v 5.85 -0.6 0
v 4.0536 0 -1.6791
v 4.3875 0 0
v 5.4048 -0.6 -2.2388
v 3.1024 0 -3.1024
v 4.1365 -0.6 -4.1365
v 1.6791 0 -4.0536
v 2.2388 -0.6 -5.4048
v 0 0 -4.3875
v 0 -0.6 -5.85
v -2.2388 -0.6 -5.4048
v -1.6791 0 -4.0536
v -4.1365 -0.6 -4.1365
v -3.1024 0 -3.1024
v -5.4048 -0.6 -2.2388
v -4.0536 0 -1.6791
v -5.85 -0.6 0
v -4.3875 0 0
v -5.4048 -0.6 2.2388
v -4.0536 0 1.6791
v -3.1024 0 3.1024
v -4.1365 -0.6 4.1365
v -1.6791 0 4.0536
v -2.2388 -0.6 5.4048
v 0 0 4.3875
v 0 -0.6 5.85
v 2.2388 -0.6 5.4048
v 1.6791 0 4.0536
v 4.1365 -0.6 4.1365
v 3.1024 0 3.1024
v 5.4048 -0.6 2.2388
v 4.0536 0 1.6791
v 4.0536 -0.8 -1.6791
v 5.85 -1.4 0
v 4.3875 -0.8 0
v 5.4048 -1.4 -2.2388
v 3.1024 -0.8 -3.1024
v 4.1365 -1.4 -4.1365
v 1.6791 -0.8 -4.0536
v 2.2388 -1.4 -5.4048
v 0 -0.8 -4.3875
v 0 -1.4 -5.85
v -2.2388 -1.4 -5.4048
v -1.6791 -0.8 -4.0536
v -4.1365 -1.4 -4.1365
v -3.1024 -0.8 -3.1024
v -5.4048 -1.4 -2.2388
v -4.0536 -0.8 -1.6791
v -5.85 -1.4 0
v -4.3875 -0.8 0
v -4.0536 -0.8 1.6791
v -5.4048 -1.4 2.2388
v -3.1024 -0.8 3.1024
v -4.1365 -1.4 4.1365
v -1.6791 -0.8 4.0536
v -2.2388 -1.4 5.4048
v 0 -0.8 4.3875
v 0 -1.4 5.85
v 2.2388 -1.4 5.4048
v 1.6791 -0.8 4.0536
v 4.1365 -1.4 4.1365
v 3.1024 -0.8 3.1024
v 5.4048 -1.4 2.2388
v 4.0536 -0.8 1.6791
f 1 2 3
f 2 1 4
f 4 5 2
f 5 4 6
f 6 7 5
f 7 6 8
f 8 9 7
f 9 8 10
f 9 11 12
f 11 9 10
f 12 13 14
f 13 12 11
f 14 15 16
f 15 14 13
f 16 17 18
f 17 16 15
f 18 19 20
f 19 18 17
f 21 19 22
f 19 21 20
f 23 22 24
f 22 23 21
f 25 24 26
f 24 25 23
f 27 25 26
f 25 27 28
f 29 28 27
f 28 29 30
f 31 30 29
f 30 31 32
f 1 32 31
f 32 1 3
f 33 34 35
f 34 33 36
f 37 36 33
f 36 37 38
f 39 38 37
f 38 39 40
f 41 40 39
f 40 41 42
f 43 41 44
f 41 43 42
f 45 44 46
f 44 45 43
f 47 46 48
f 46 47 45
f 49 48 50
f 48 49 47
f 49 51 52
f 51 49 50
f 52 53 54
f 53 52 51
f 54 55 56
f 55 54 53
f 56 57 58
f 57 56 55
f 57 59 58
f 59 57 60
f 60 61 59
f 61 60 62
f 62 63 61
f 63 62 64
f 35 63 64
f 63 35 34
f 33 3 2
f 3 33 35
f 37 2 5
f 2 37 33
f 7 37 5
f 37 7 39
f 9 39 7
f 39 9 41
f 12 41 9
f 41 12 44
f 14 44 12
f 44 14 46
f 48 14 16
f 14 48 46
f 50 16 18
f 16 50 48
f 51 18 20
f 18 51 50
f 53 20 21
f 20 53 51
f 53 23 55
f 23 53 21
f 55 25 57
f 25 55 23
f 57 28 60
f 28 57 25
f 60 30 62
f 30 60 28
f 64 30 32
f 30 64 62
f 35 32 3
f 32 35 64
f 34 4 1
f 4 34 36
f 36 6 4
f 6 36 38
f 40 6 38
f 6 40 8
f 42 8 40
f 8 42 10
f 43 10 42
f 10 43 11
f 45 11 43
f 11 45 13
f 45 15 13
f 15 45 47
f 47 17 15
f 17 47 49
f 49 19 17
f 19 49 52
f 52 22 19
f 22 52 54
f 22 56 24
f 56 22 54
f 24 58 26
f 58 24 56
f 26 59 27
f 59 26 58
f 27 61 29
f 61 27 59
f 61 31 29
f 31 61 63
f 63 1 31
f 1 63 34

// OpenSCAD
// file: ../p/4-4edge.scad
use <../lib.scad>
function ldraw_lib__4_4edge() = [
// 0 Circle 1.0
// 0 Name: 4-4edge.dat
// 0 Author: James Jessiman
// 0 !LDRAW_ORG Primitive UPDATE 2017-01
// 0 !LICENSE Licensed under CC BY 2.0 and CC BY 4.0 : see CAreadme.txt
// 
// 0 BFC CERTIFY CCW
  [0,"BFC","CERTIFY"],
  [0,"BFC","CCW"],
// 
// 0 !HISTORY 1998-12-15 [PTadmin] Official Update 1998-10
// 0 !HISTORY 2005-12-28 [PTadmin] Official Update 2005-01
// 0 !HISTORY 2007-06-24 [PTadmin] Header formatted for Contributor Agreement
// 0 !HISTORY 2008-07-01 [PTadmin] Official Update 2008-01
// 0 !HISTORY 2017-01-15 [Steffen] BFCed
// 0 !HISTORY 2017-12-30 [PTadmin] Official Update 2017-01
// 
// 
// 2 24 1 0 0 0.9239 0 0.3827
  [2,24,1,0,0,0.9239,0,0.3827],
// 2 24 0.9239 0 0.3827 0.7071 0 0.7071
  [2,24,0.9239,0,0.3827,0.7071,0,0.7071],
// 2 24 0.7071 0 0.7071 0.3827 0 0.9239
  [2,24,0.7071,0,0.7071,0.3827,0,0.9239],
// 2 24 0.3827 0 0.9239 0 0 1
  [2,24,0.3827,0,0.9239,0,0,1],
// 2 24 0 0 1 -0.3827 0 0.9239
  [2,24,0,0,1,-0.3827,0,0.9239],
// 2 24 -0.3827 0 0.9239 -0.7071 0 0.7071
  [2,24,-0.3827,0,0.9239,-0.7071,0,0.7071],
// 2 24 -0.7071 0 0.7071 -0.9239 0 0.3827
  [2,24,-0.7071,0,0.7071,-0.9239,0,0.3827],
// 2 24 -0.9239 0 0.3827 -1 0 -0
  [2,24,-0.9239,0,0.3827,-1,0,-0],
// 2 24 -1 0 -0 -0.9239 0 -0.3827
  [2,24,-1,0,-0,-0.9239,0,-0.3827],
// 2 24 -0.9239 0 -0.3827 -0.7071 0 -0.7071
  [2,24,-0.9239,0,-0.3827,-0.7071,0,-0.7071],
// 2 24 -0.7071 0 -0.7071 -0.3827 0 -0.9239
  [2,24,-0.7071,0,-0.7071,-0.3827,0,-0.9239],
// 2 24 -0.3827 0 -0.9239 0 0 -1
  [2,24,-0.3827,0,-0.9239,0,0,-1],
// 2 24 0 0 -1 0.3827 0 -0.9239
  [2,24,0,0,-1,0.3827,0,-0.9239],
// 2 24 0.3827 0 -0.9239 0.7071 0 -0.7071
  [2,24,0.3827,0,-0.9239,0.7071,0,-0.7071],
// 2 24 0.7071 0 -0.7071 0.9239 0 -0.3827
  [2,24,0.7071,0,-0.7071,0.9239,0,-0.3827],
// 2 24 0.9239 0 -0.3827 1 0 0
  [2,24,0.9239,0,-0.3827,1,0,0],
];
module ldraw_lib__4_4edge(step=0, col=false, unit=2/5, alt=false, line=0.2, solid=!$preview)
    makepoly(ldraw_lib__4_4edge(), step=step, col=col, unit=unit, alt=alt, line=line, solid=solid);
ldraw_lib__4_4edge(line=0.2);
// file: ../p/4-4cyli.scad
use <../lib.scad>
function ldraw_lib__4_4cyli() = [
// 0 Cylinder 1.0
// 0 Name: 4-4cyli.dat
// 0 Author: James Jessiman
// 0 !LDRAW_ORG Primitive UPDATE 2005-01
// 0 !LICENSE Licensed under CC BY 2.0 and CC BY 4.0 : see CAreadme.txt
// 
// 0 BFC CERTIFY CCW
  [0,"BFC","CERTIFY"],
  [0,"BFC","CCW"],
// 
// 0 !HISTORY 1998-12-15 [PTadmin] Official Update 1998-10
// 0 !HISTORY 2002-03-23 [sbliss] Added BFC statement; merged headers from files in distributions LDraw 0.27 and Complete.
// 0 !HISTORY 2002-04-25 [PTadmin] Official Update 2002-02
// 0 !HISTORY 2004-12-14 [guyvivan] BFC CCW
// 0 !HISTORY 2005-12-28 [PTadmin] Official Update 2005-01
// 0 !HISTORY 2007-06-24 [PTadmin] Header formatted for Contributor Agreement
// 0 !HISTORY 2008-07-01 [PTadmin] Official Update 2008-01
// 
// 
// 4 16 1 1 0 0.9239 1 0.3827 0.9239 0 0.3827 1 0 0
  [4,16,1,1,0,0.9239,1,0.3827,0.9239,0,0.3827,1,0,0],
// 5 24 1 0 0 1 1 0 0.9239 0 0.3827 0.9239 0 -0.3827
  [5,24,1,0,0,1,1,0,0.9239,0,0.3827,0.9239,0,-0.3827],
// 4 16 0.9239 1 0.3827 0.7071 1 0.7071 0.7071 0 0.7071 0.9239 0 0.3827
  [4,16,0.9239,1,0.3827,0.7071,1,0.7071,0.7071,0,0.7071,0.9239,0,0.3827],
// 5 24 0.9239 0 0.3827 0.9239 1 0.3827 0.7071 0 0.7071 1 0 0
  [5,24,0.9239,0,0.3827,0.9239,1,0.3827,0.7071,0,0.7071,1,0,0],
// 4 16 0.7071 1 0.7071 0.3827 1 0.9239 0.3827 0 0.9239 0.7071 0 0.7071
  [4,16,0.7071,1,0.7071,0.3827,1,0.9239,0.3827,0,0.9239,0.7071,0,0.7071],
// 5 24 0.7071 0 0.7071 0.7071 1 0.7071 0.3827 0 0.9239 0.9239 0 0.3827
  [5,24,0.7071,0,0.7071,0.7071,1,0.7071,0.3827,0,0.9239,0.9239,0,0.3827],
// 4 16 0.3827 1 0.9239 0 1 1 0 0 1 0.3827 0 0.9239
  [4,16,0.3827,1,0.9239,0,1,1,0,0,1,0.3827,0,0.9239],
// 5 24 0.3827 0 0.9239 0.3827 1 0.9239 0 0 1 0.7071 0 0.7071
  [5,24,0.3827,0,0.9239,0.3827,1,0.9239,0,0,1,0.7071,0,0.7071],
// 4 16 0 1 1 -0.3827 1 0.9239 -0.3827 0 0.9239 0 0 1
  [4,16,0,1,1,-0.3827,1,0.9239,-0.3827,0,0.9239,0,0,1],
// 5 24 0 0 1 0 1 1 -0.3827 0 0.9239 0.3827 0 0.9239
  [5,24,0,0,1,0,1,1,-0.3827,0,0.9239,0.3827,0,0.9239],
// 4 16 -0.3827 1 0.9239 -0.7071 1 0.7071 -0.7071 0 0.7071 -0.3827 0 0.9239
  [4,16,-0.3827,1,0.9239,-0.7071,1,0.7071,-0.7071,0,0.7071,-0.3827,0,0.9239],
// 5 24 -0.3827 0 0.9239 -0.3827 1 0.9239 -0.7071 0 0.7071 0 0 1
  [5,24,-0.3827,0,0.9239,-0.3827,1,0.9239,-0.7071,0,0.7071,0,0,1],
// 4 16 -0.7071 1 0.7071 -0.9239 1 0.3827 -0.9239 0 0.3827 -0.7071 0 0.7071
  [4,16,-0.7071,1,0.7071,-0.9239,1,0.3827,-0.9239,0,0.3827,-0.7071,0,0.7071],
// 5 24 -0.7071 0 0.7071 -0.7071 1 0.7071 -0.9239 0 0.3827 -0.3827 0 0.9239
  [5,24,-0.7071,0,0.7071,-0.7071,1,0.7071,-0.9239,0,0.3827,-0.3827,0,0.9239],
// 4 16 -0.9239 1 0.3827 -1 1 0 -1 0 0 -0.9239 0 0.3827
  [4,16,-0.9239,1,0.3827,-1,1,0,-1,0,0,-0.9239,0,0.3827],
// 5 24 -0.9239 0 0.3827 -0.9239 1 0.3827 -1 0 0 -0.7071 0 0.7071
  [5,24,-0.9239,0,0.3827,-0.9239,1,0.3827,-1,0,0,-0.7071,0,0.7071],
// 4 16 -1 1 0 -0.9239 1 -0.3827 -0.9239 0 -0.3827 -1 0 0
  [4,16,-1,1,0,-0.9239,1,-0.3827,-0.9239,0,-0.3827,-1,0,0],
// 5 24 -1 0 0 -1 1 0 -0.9239 0 -0.3827 -0.9239 0 0.3827
  [5,24,-1,0,0,-1,1,0,-0.9239,0,-0.3827,-0.9239,0,0.3827],
// 4 16 -0.9239 1 -0.3827 -0.7071 1 -0.7071 -0.7071 0 -0.7071 -0.9239 0 -0.3827
  [4,16,-0.9239,1,-0.3827,-0.7071,1,-0.7071,-0.7071,0,-0.7071,-0.9239,0,-0.3827],
// 5 24 -0.9239 0 -0.3827 -0.9239 1 -0.3827 -0.7071 0 -0.7071 -1 0 0
  [5,24,-0.9239,0,-0.3827,-0.9239,1,-0.3827,-0.7071,0,-0.7071,-1,0,0],
// 4 16 -0.7071 1 -0.7071 -0.3827 1 -0.9239 -0.3827 0 -0.9239 -0.7071 0 -0.7071
  [4,16,-0.7071,1,-0.7071,-0.3827,1,-0.9239,-0.3827,0,-0.9239,-0.7071,0,-0.7071],
// 5 24 -0.7071 0 -0.7071 -0.7071 1 -0.7071 -0.3827 0 -0.9239 -0.9239 0 -0.3827
  [5,24,-0.7071,0,-0.7071,-0.7071,1,-0.7071,-0.3827,0,-0.9239,-0.9239,0,-0.3827],
// 4 16 -0.3827 1 -0.9239 0 1 -1 0 0 -1 -0.3827 0 -0.9239
  [4,16,-0.3827,1,-0.9239,0,1,-1,0,0,-1,-0.3827,0,-0.9239],
// 5 24 -0.3827 0 -0.9239 -0.3827 1 -0.9239 0 0 -1 -0.7071 0 -0.7071
  [5,24,-0.3827,0,-0.9239,-0.3827,1,-0.9239,0,0,-1,-0.7071,0,-0.7071],
// 4 16 0 1 -1 0.3827 1 -0.9239 0.3827 0 -0.9239 0 0 -1
  [4,16,0,1,-1,0.3827,1,-0.9239,0.3827,0,-0.9239,0,0,-1],
// 5 24 0 0 -1 0 1 -1 0.3827 0 -0.9239 -0.3827 0 -0.9239
  [5,24,0,0,-1,0,1,-1,0.3827,0,-0.9239,-0.3827,0,-0.9239],
// 4 16 0.3827 1 -0.9239 0.7071 1 -0.7071 0.7071 0 -0.7071 0.3827 0 -0.9239
  [4,16,0.3827,1,-0.9239,0.7071,1,-0.7071,0.7071,0,-0.7071,0.3827,0,-0.9239],
// 5 24 0.3827 0 -0.9239 0.3827 1 -0.9239 0.7071 0 -0.7071 0 0 -1
  [5,24,0.3827,0,-0.9239,0.3827,1,-0.9239,0.7071,0,-0.7071,0,0,-1],
// 4 16 0.7071 1 -0.7071 0.9239 1 -0.3827 0.9239 0 -0.3827 0.7071 0 -0.7071
  [4,16,0.7071,1,-0.7071,0.9239,1,-0.3827,0.9239,0,-0.3827,0.7071,0,-0.7071],
// 5 24 0.7071 0 -0.7071 0.7071 1 -0.7071 0.9239 0 -0.3827 0.3827 0 -0.9239
  [5,24,0.7071,0,-0.7071,0.7071,1,-0.7071,0.9239,0,-0.3827,0.3827,0,-0.9239],
// 4 16 0.9239 1 -0.3827 1 1 0 1 0 0 0.9239 0 -0.3827
  [4,16,0.9239,1,-0.3827,1,1,0,1,0,0,0.9239,0,-0.3827],
// 5 24 0.9239 0 -0.3827 0.9239 1 -0.3827 1 0 0 0.7071 0 -0.7071
  [5,24,0.9239,0,-0.3827,0.9239,1,-0.3827,1,0,0,0.7071,0,-0.7071],
// 0
];
module ldraw_lib__4_4cyli(step=0, col=false, unit=2/5, alt=false, line=0.2, solid=!$preview)
    makepoly(ldraw_lib__4_4cyli(), step=step, col=col, unit=unit, alt=alt, line=line, solid=solid);
ldraw_lib__4_4cyli(line=0.2);
// file: ../p/4-4cylo.scad
use <../lib.scad>
use <4-4cyli.scad>
use <4-4edge.scad>
function ldraw_lib__4_4cylo() = [
// 0 Cylinder Open 1.0
// 0 Name: 4-4cylo.dat
// 0 Author: Mark Kennedy [mkennedy]
// 0 !LDRAW_ORG Primitive UPDATE 2010-01
// 0 !LICENSE Licensed under CC BY 2.0 and CC BY 4.0 : see CAreadme.txt
// 
// 0 BFC CERTIFY CCW
  [0,"BFC","CERTIFY"],
  [0,"BFC","CCW"],
// 
// 0 !HISTORY 2010-04-05 [PTadmin] Official Update 2010-01
// 
// 
// 1 16 0 0 0 1 0 0 0 1 0 0 0 1 4-4edge.dat
  [1,16,0,0,0,1,0,0,0,1,0,0,0,1, ldraw_lib__4_4edge()],
// 1 16 0 1 0 1 0 0 0 1 0 0 0 1 4-4edge.dat
  [1,16,0,1,0,1,0,0,0,1,0,0,0,1, ldraw_lib__4_4edge()],
// 1 16 0 0 0 1 0 0 0 1 0 0 0 1 4-4cyli.dat
  [1,16,0,0,0,1,0,0,0,1,0,0,0,1, ldraw_lib__4_4cyli()],
// 0
];
module ldraw_lib__4_4cylo(step=0, col=false, unit=2/5, alt=false, line=0.2, solid=!$preview)
    makepoly(ldraw_lib__4_4cylo(), step=step, col=col, unit=unit, alt=alt, line=line, solid=solid);
ldraw_lib__4_4cylo(line=0.2);
// file: ../p/4-4con3.scad
use <../lib.scad>
function ldraw_lib__4_4con3() = [
// 0 Cone  3 x 1.0
// 0 Name: 4-4con3.dat
// 0 Author: Niels Karsdorp [nielsk]
// 0 !LDRAW_ORG Primitive UPDATE 2003-02
// 0 !LICENSE Licensed under CC BY 2.0 and CC BY 4.0 : see CAreadme.txt
// 
// 0 BFC CERTIFY CCW
  [0,"BFC","CERTIFY"],
  [0,"BFC","CCW"],
// 
// 0 !HISTORY 2003-08-01 [PTadmin] Official Update 2003-02
// 0 !HISTORY 2007-06-24 [PTadmin] Header formatted for Contributor Agreement
// 0 !HISTORY 2008-07-01 [PTadmin] Official Update 2008-01
// 
// 
// 5 24 3 1 0 4 0 0 2.7717 1 1.1481 2.7717 1 -1.1481
  [5,24,3,1,0,4,0,0,2.7717,1,1.1481,2.7717,1,-1.1481],
// 5 24 2.7717 1 1.1481 3.6956 0 1.5308 2.1213 1 2.1213 3 1 0
  [5,24,2.7717,1,1.1481,3.6956,0,1.5308,2.1213,1,2.1213,3,1,0],
// 5 24 2.1213 1 2.1213 2.8284 0 2.8284 1.1481 1 2.7717 2.7717 1 1.1481
  [5,24,2.1213,1,2.1213,2.8284,0,2.8284,1.1481,1,2.7717,2.7717,1,1.1481],
// 5 24 1.1481 1 2.7717 1.5308 0 3.6956 0 1 3 2.1213 1 2.1213
  [5,24,1.1481,1,2.7717,1.5308,0,3.6956,0,1,3,2.1213,1,2.1213],
// 5 24 0 1 3 0 0 4 -1.1481 1 2.7717 1.1481 1 2.7717
  [5,24,0,1,3,0,0,4,-1.1481,1,2.7717,1.1481,1,2.7717],
// 5 24 -1.1481 1 2.7717 -1.5308 0 3.6956 -2.1213 1 2.1213 0 1 3
  [5,24,-1.1481,1,2.7717,-1.5308,0,3.6956,-2.1213,1,2.1213,0,1,3],
// 5 24 -2.1213 1 2.1213 -2.8284 0 2.8284 -2.7717 1 1.1481 -1.1481 1 2.7717
  [5,24,-2.1213,1,2.1213,-2.8284,0,2.8284,-2.7717,1,1.1481,-1.1481,1,2.7717],
// 5 24 -2.7717 1 1.1481 -3.6956 0 1.5308 -3 1 0 -2.1213 1 2.1213
  [5,24,-2.7717,1,1.1481,-3.6956,0,1.5308,-3,1,0,-2.1213,1,2.1213],
// 5 24 -3 1 0 -4 0 0 -2.7717 1 -1.1481 -2.7717 1 1.1481
  [5,24,-3,1,0,-4,0,0,-2.7717,1,-1.1481,-2.7717,1,1.1481],
// 5 24 -2.7717 1 -1.1481 -3.6956 0 -1.5308 -2.1213 1 -2.1213 -3 1 0
  [5,24,-2.7717,1,-1.1481,-3.6956,0,-1.5308,-2.1213,1,-2.1213,-3,1,0],
// 5 24 -2.1213 1 -2.1213 -2.8284 0 -2.8284 -1.1481 1 -2.7717 -2.7717 1 -1.1481
  [5,24,-2.1213,1,-2.1213,-2.8284,0,-2.8284,-1.1481,1,-2.7717,-2.7717,1,-1.1481],
// 5 24 -1.1481 1 -2.7717 -1.5308 0 -3.6956 0 1 -3 -2.1213 1 -2.1213
  [5,24,-1.1481,1,-2.7717,-1.5308,0,-3.6956,0,1,-3,-2.1213,1,-2.1213],
// 5 24 0 1 -3 0 0 -4 1.1481 1 -2.7717 -1.1481 1 -2.7717
  [5,24,0,1,-3,0,0,-4,1.1481,1,-2.7717,-1.1481,1,-2.7717],
// 5 24 1.1481 1 -2.7717 1.5308 0 -3.6956 2.1213 1 -2.1213 0 1 -3
  [5,24,1.1481,1,-2.7717,1.5308,0,-3.6956,2.1213,1,-2.1213,0,1,-3],
// 5 24 2.1213 1 -2.1213 2.8284 0 -2.8284 2.7717 1 -1.1481 1.1481 1 -2.7717
  [5,24,2.1213,1,-2.1213,2.8284,0,-2.8284,2.7717,1,-1.1481,1.1481,1,-2.7717],
// 5 24 2.7717 1 -1.1481 3.6956 0 -1.5308 3 1 0 2.1213 1 -2.1213
  [5,24,2.7717,1,-1.1481,3.6956,0,-1.5308,3,1,0,2.1213,1,-2.1213],
// 
// 4 16 3 1 0 2.7717 1 1.1481 3.6956 0 1.5308 4 0 0
  [4,16,3,1,0,2.7717,1,1.1481,3.6956,0,1.5308,4,0,0],
// 4 16 2.7717 1 1.1481 2.1213 1 2.1213 2.8284 0 2.8284 3.6956 0 1.5308
  [4,16,2.7717,1,1.1481,2.1213,1,2.1213,2.8284,0,2.8284,3.6956,0,1.5308],
// 4 16 2.1213 1 2.1213 1.1481 1 2.7717 1.5308 0 3.6956 2.8284 0 2.8284
  [4,16,2.1213,1,2.1213,1.1481,1,2.7717,1.5308,0,3.6956,2.8284,0,2.8284],
// 4 16 1.1481 1 2.7717 0 1 3 0 0 4 1.5308 0 3.6956
  [4,16,1.1481,1,2.7717,0,1,3,0,0,4,1.5308,0,3.6956],
// 4 16 0 1 3 -1.1481 1 2.7717 -1.5308 0 3.6956 0 0 4
  [4,16,0,1,3,-1.1481,1,2.7717,-1.5308,0,3.6956,0,0,4],
// 4 16 -1.1481 1 2.7717 -2.1213 1 2.1213 -2.8284 0 2.8284 -1.5308 0 3.6956
  [4,16,-1.1481,1,2.7717,-2.1213,1,2.1213,-2.8284,0,2.8284,-1.5308,0,3.6956],
// 4 16 -2.1213 1 2.1213 -2.7717 1 1.1481 -3.6956 0 1.5308 -2.8284 0 2.8284
  [4,16,-2.1213,1,2.1213,-2.7717,1,1.1481,-3.6956,0,1.5308,-2.8284,0,2.8284],
// 4 16 -2.7717 1 1.1481 -3 1 0 -4 0 0 -3.6956 0 1.5308
  [4,16,-2.7717,1,1.1481,-3,1,0,-4,0,0,-3.6956,0,1.5308],
// 4 16 -3 1 0 -2.7717 1 -1.1481 -3.6956 0 -1.5308 -4 0 0
  [4,16,-3,1,0,-2.7717,1,-1.1481,-3.6956,0,-1.5308,-4,0,0],
// 4 16 -2.7717 1 -1.1481 -2.1213 1 -2.1213 -2.8284 0 -2.8284 -3.6956 0 -1.5308
  [4,16,-2.7717,1,-1.1481,-2.1213,1,-2.1213,-2.8284,0,-2.8284,-3.6956,0,-1.5308],
// 4 16 -2.1213 1 -2.1213 -1.1481 1 -2.7717 -1.5308 0 -3.6956 -2.8284 0 -2.8284
  [4,16,-2.1213,1,-2.1213,-1.1481,1,-2.7717,-1.5308,0,-3.6956,-2.8284,0,-2.8284],
// 4 16 -1.1481 1 -2.7717 0 1 -3 0 0 -4 -1.5308 0 -3.6956
  [4,16,-1.1481,1,-2.7717,0,1,-3,0,0,-4,-1.5308,0,-3.6956],
// 4 16 0 1 -3 1.1481 1 -2.7717 1.5308 0 -3.6956 0 0 -4
  [4,16,0,1,-3,1.1481,1,-2.7717,1.5308,0,-3.6956,0,0,-4],
// 4 16 1.1481 1 -2.7717 2.1213 1 -2.1213 2.8284 0 -2.8284 1.5308 0 -3.6956
  [4,16,1.1481,1,-2.7717,2.1213,1,-2.1213,2.8284,0,-2.8284,1.5308,0,-3.6956],
// 4 16 2.1213 1 -2.1213 2.7717 1 -1.1481 3.6956 0 -1.5308 2.8284 0 -2.8284
  [4,16,2.1213,1,-2.1213,2.7717,1,-1.1481,3.6956,0,-1.5308,2.8284,0,-2.8284],
// 4 16 2.7717 1 -1.1481 3 1 0 4 0 0 3.6956 0 -1.5308
  [4,16,2.7717,1,-1.1481,3,1,0,4,0,0,3.6956,0,-1.5308],
// 
// 0
// 
];
module ldraw_lib__4_4con3(step=0, col=false, unit=2/5, alt=false, line=0.2, solid=!$preview)
    makepoly(ldraw_lib__4_4con3(), step=step, col=col, unit=unit, alt=alt, line=line, solid=solid);
ldraw_lib__4_4con3(line=0.2);
// main file
use <../lib.scad>
use <../p/4-4con3.scad>
use <../p/4-4cylo.scad>
function ldraw_lib__u9405() = [
// 0 ~Electric Powered Up Colour Sensor Lighting Ring
// 0 Name: u9405.dat
// 0 Author: Philippe Hurbain [Philo]
// 0 !LDRAW_ORG Part UPDATE 2020-03
// 0 !LICENSE Licensed under CC BY 2.0 and CC BY 4.0 : see CAreadme.txt
// 
// 0 BFC CERTIFY CCW
  [0,"BFC","CERTIFY"],
  [0,"BFC","CCW"],
// 
// 0 !KEYWORDS Mindstorms, Robot Inventor, Spike Prime
// 
// 0 !HISTORY 2019-06-28 [PTadmin] Official Update 2019-01
// 0 !HISTORY 2020-12-27 [PTadmin] Update description
// 0 !HISTORY 2020-12-29 [PTadmin] Official Update 2020-03
// 
// 
// 1 16 0 0 -1.5 3.65625 0 0 0 0 3.65625 0 1.5 0 4-4con3.dat
  [1,16,0,0,-1.5,3.65625,0,0,0,0,3.65625,0,1.5,0, ldraw_lib__4_4con3()],
// 0 BFC INVERTNEXT
  [0,"BFC","INVERTNEXT"],
// 1 16 0 0 -3.5 3.65625 0 0 0 0 3.65625 0 1.5 0 4-4con3.dat
  [1,16,0,0,-3.5,3.65625,0,0,0,0,3.65625,0,1.5,0, ldraw_lib__4_4con3()],
// 0 BFC INVERTNEXT
  [0,"BFC","INVERTNEXT"],
// 1 16 0 0 0 10.96875 0 0 0 0 10.96875 0 -2 0 4-4cylo.dat
  [1,16,0,0,0,10.96875,0,0,0,0,10.96875,0,-2,0, ldraw_lib__4_4cylo()],
// 1 16 0 0 -1.5 14.625 0 0 0 0 14.625 0 -2 0 4-4cylo.dat
  [1,16,0,0,-1.5,14.625,0,0,0,0,14.625,0,-2,0, ldraw_lib__4_4cylo()],
];
module ldraw_lib__u9405(step=0, col=false, unit=2/5, alt=false, line=0.2, solid=!$preview)
    makepoly(ldraw_lib__u9405(), step=step, col=col, unit=unit, alt=alt, line=line, solid=solid);
ldraw_lib__u9405(line=0.2);
